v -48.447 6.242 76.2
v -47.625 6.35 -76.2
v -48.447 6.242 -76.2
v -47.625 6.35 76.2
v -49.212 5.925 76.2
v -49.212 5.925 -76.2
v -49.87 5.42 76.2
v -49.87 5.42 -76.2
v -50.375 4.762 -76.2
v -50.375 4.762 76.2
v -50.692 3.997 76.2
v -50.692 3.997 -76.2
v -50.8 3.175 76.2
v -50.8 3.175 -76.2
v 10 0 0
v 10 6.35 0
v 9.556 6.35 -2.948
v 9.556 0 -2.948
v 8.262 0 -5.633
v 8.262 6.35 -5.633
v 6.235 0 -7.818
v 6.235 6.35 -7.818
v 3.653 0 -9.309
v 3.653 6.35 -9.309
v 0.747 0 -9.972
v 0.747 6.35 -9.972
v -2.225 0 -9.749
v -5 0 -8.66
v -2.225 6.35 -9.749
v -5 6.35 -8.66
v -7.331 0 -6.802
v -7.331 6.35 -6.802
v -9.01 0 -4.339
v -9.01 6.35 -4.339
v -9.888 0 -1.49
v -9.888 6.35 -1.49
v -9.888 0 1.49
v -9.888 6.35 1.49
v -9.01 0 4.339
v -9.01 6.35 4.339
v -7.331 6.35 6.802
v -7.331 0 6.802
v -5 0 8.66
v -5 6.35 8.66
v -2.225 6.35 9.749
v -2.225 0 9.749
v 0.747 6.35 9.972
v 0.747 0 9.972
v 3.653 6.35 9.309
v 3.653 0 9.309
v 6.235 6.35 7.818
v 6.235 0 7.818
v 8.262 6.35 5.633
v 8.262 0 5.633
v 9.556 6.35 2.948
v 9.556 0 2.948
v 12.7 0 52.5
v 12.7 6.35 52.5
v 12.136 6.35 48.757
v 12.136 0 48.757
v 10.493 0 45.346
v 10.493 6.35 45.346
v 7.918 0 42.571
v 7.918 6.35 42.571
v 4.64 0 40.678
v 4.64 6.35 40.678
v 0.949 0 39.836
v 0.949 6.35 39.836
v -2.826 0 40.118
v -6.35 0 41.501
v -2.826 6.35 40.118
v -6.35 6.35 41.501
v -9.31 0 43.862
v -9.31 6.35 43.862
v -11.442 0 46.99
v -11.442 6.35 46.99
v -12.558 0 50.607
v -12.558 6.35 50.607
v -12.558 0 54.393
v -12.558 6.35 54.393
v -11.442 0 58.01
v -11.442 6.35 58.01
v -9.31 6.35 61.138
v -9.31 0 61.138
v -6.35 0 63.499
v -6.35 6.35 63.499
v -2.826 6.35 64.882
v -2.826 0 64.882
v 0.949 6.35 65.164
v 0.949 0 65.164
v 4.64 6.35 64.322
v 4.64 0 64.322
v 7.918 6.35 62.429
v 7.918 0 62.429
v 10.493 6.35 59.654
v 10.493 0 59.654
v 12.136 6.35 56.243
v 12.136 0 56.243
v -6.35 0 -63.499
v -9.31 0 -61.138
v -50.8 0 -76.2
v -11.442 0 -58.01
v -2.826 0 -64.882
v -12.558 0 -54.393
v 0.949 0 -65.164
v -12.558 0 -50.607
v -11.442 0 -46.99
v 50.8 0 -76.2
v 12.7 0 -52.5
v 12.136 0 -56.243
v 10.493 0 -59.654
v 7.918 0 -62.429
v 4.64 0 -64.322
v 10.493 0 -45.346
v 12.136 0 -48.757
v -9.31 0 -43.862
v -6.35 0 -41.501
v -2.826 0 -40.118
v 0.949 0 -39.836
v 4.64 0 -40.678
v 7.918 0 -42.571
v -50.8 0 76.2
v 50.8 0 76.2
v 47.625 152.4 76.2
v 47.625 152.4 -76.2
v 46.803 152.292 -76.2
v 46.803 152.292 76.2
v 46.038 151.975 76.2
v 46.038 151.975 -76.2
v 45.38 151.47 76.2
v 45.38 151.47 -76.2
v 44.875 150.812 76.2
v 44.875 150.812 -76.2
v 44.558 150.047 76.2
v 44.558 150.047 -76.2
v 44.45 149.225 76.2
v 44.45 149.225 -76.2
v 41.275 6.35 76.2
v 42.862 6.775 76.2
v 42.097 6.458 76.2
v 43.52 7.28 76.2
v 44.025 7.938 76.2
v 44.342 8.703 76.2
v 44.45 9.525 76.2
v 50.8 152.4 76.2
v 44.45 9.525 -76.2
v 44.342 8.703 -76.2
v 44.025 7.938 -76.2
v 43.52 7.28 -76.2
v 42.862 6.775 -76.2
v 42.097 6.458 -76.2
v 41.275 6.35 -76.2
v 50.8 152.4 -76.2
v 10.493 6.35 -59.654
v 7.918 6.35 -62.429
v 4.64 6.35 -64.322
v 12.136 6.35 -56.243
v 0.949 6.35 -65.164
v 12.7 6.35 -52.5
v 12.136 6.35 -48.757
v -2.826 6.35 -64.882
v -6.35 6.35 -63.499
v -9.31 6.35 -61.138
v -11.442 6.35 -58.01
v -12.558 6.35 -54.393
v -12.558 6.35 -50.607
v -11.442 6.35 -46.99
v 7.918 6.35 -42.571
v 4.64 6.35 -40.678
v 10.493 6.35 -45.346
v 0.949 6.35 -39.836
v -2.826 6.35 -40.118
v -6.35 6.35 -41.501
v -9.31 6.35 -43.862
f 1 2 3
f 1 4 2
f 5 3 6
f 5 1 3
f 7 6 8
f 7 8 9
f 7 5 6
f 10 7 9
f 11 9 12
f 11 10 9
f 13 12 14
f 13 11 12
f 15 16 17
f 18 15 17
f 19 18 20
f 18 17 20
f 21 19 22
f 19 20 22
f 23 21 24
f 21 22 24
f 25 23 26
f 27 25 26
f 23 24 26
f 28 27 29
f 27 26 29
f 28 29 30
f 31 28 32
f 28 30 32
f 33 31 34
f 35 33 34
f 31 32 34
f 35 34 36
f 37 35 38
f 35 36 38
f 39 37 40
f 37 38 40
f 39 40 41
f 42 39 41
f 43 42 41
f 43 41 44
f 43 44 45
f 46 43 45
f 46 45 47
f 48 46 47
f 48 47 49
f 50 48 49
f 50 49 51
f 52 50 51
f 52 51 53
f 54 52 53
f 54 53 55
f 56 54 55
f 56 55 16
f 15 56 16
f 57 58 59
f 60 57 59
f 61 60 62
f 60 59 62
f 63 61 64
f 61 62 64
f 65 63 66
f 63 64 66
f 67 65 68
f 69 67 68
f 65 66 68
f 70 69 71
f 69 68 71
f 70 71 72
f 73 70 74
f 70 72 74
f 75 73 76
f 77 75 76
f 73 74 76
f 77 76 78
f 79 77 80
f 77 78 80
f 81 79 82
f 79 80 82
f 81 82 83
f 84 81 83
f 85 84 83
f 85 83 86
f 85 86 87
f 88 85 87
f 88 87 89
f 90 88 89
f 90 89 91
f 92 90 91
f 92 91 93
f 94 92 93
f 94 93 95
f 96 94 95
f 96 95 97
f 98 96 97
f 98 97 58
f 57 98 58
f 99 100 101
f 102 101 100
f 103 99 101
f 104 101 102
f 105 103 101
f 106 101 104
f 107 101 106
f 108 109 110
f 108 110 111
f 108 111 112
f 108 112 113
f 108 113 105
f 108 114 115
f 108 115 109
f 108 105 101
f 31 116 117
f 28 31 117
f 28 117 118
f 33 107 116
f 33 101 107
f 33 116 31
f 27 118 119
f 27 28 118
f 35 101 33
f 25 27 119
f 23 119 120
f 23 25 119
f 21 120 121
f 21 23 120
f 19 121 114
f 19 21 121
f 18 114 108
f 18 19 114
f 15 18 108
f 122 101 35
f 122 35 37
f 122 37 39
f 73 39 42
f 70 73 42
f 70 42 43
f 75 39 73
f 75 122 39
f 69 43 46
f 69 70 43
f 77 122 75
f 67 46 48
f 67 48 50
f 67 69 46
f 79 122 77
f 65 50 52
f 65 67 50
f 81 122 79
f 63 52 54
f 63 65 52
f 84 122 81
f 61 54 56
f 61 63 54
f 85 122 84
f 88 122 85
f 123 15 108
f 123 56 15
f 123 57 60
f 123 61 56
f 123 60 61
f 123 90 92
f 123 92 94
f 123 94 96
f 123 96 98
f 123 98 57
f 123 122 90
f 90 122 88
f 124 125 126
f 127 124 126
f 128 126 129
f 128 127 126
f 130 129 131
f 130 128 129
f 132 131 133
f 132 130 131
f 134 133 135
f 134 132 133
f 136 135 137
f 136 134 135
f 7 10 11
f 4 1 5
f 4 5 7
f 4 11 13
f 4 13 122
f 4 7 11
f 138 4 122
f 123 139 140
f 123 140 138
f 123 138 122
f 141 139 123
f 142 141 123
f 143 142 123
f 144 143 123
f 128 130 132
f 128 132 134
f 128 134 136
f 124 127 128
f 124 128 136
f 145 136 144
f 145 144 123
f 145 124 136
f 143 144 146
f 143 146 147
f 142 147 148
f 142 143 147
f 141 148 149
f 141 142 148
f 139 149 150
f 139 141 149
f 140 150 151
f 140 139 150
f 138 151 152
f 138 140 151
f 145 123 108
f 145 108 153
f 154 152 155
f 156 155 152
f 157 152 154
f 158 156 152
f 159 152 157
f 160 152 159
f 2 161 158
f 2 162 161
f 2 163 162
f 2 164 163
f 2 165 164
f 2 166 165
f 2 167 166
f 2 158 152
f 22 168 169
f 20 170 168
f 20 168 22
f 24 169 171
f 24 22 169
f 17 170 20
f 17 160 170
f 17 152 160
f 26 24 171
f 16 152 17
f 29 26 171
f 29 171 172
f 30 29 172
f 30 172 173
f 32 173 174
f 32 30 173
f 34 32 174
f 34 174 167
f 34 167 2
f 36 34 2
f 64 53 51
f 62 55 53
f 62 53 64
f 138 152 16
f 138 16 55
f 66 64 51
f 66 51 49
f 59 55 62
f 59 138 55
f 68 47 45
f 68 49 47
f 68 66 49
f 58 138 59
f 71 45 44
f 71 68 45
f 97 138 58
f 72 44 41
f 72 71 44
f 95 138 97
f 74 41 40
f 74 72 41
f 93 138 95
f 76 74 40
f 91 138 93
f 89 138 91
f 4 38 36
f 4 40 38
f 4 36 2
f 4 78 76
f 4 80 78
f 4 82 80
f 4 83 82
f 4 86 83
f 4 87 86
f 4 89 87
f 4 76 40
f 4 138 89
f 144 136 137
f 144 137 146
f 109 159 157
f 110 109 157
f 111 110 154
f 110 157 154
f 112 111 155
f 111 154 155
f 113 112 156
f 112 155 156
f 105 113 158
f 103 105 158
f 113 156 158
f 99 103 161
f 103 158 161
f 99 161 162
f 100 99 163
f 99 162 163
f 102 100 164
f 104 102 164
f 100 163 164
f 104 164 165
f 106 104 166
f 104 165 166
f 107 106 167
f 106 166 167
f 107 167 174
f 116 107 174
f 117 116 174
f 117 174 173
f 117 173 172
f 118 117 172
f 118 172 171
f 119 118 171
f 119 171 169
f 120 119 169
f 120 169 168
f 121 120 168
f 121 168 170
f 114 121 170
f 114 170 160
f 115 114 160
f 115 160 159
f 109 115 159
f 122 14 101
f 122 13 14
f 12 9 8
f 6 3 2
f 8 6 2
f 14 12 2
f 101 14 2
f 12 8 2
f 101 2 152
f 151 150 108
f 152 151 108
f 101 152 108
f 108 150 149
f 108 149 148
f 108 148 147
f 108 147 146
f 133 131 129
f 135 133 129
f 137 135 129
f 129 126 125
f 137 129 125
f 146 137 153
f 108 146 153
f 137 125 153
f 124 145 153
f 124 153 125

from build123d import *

# Parameters (mm, degrees)
BOSS_EXTRUDE1_DEPTH = 76.2
SKETCH3_R           = 12.7
SKETCH3_R_2         = 10
CUT_EXTRUDE1_DEPTH  = 7.35


with BuildPart() as part:
    # Sketch2 → Boss-Extrude1 (new body, symmetric)
    with BuildSketch(Plane.XY):
        with BuildLine():
            Line((-50.8, 0), (50.8, 0))
            Line((50.8, 0), (50.8, 152.4))
            Line((50.8, 152.4), (47.625, 152.4))
            ThreePointArc((47.625, 152.4), (45.37993597, 151.47006403), (44.45, 149.225))
            Line((44.45, 149.225), (44.45, 9.525))
            ThreePointArc((44.45, 9.525), (43.52006403, 7.27993597), (41.275, 6.35))
            Line((41.275, 6.35), (-47.625, 6.35))
            ThreePointArc((-47.625, 6.35), (-49.87006403, 5.42006403), (-50.8, 3.175))
            Line((-50.8, 3.175), (-50.8, 0))
        make_face()
    extrude(amount=BOSS_EXTRUDE1_DEPTH, both=True)

    # Sketch3 → Cut-Extrude1 (cut, through all)
    with BuildSketch(Plane(origin=(0, 6.35, 0), x_dir=(1, 0, 0), z_dir=(0, 1, 0))):
        with Locations((0, 52.5)):
            Circle(SKETCH3_R)
        with Locations((0, -52.5)):
            Circle(SKETCH3_R)
        Circle(SKETCH3_R_2)
    extrude(amount=-CUT_EXTRUDE1_DEPTH, mode=Mode.SUBTRACT)


solid = part.part
